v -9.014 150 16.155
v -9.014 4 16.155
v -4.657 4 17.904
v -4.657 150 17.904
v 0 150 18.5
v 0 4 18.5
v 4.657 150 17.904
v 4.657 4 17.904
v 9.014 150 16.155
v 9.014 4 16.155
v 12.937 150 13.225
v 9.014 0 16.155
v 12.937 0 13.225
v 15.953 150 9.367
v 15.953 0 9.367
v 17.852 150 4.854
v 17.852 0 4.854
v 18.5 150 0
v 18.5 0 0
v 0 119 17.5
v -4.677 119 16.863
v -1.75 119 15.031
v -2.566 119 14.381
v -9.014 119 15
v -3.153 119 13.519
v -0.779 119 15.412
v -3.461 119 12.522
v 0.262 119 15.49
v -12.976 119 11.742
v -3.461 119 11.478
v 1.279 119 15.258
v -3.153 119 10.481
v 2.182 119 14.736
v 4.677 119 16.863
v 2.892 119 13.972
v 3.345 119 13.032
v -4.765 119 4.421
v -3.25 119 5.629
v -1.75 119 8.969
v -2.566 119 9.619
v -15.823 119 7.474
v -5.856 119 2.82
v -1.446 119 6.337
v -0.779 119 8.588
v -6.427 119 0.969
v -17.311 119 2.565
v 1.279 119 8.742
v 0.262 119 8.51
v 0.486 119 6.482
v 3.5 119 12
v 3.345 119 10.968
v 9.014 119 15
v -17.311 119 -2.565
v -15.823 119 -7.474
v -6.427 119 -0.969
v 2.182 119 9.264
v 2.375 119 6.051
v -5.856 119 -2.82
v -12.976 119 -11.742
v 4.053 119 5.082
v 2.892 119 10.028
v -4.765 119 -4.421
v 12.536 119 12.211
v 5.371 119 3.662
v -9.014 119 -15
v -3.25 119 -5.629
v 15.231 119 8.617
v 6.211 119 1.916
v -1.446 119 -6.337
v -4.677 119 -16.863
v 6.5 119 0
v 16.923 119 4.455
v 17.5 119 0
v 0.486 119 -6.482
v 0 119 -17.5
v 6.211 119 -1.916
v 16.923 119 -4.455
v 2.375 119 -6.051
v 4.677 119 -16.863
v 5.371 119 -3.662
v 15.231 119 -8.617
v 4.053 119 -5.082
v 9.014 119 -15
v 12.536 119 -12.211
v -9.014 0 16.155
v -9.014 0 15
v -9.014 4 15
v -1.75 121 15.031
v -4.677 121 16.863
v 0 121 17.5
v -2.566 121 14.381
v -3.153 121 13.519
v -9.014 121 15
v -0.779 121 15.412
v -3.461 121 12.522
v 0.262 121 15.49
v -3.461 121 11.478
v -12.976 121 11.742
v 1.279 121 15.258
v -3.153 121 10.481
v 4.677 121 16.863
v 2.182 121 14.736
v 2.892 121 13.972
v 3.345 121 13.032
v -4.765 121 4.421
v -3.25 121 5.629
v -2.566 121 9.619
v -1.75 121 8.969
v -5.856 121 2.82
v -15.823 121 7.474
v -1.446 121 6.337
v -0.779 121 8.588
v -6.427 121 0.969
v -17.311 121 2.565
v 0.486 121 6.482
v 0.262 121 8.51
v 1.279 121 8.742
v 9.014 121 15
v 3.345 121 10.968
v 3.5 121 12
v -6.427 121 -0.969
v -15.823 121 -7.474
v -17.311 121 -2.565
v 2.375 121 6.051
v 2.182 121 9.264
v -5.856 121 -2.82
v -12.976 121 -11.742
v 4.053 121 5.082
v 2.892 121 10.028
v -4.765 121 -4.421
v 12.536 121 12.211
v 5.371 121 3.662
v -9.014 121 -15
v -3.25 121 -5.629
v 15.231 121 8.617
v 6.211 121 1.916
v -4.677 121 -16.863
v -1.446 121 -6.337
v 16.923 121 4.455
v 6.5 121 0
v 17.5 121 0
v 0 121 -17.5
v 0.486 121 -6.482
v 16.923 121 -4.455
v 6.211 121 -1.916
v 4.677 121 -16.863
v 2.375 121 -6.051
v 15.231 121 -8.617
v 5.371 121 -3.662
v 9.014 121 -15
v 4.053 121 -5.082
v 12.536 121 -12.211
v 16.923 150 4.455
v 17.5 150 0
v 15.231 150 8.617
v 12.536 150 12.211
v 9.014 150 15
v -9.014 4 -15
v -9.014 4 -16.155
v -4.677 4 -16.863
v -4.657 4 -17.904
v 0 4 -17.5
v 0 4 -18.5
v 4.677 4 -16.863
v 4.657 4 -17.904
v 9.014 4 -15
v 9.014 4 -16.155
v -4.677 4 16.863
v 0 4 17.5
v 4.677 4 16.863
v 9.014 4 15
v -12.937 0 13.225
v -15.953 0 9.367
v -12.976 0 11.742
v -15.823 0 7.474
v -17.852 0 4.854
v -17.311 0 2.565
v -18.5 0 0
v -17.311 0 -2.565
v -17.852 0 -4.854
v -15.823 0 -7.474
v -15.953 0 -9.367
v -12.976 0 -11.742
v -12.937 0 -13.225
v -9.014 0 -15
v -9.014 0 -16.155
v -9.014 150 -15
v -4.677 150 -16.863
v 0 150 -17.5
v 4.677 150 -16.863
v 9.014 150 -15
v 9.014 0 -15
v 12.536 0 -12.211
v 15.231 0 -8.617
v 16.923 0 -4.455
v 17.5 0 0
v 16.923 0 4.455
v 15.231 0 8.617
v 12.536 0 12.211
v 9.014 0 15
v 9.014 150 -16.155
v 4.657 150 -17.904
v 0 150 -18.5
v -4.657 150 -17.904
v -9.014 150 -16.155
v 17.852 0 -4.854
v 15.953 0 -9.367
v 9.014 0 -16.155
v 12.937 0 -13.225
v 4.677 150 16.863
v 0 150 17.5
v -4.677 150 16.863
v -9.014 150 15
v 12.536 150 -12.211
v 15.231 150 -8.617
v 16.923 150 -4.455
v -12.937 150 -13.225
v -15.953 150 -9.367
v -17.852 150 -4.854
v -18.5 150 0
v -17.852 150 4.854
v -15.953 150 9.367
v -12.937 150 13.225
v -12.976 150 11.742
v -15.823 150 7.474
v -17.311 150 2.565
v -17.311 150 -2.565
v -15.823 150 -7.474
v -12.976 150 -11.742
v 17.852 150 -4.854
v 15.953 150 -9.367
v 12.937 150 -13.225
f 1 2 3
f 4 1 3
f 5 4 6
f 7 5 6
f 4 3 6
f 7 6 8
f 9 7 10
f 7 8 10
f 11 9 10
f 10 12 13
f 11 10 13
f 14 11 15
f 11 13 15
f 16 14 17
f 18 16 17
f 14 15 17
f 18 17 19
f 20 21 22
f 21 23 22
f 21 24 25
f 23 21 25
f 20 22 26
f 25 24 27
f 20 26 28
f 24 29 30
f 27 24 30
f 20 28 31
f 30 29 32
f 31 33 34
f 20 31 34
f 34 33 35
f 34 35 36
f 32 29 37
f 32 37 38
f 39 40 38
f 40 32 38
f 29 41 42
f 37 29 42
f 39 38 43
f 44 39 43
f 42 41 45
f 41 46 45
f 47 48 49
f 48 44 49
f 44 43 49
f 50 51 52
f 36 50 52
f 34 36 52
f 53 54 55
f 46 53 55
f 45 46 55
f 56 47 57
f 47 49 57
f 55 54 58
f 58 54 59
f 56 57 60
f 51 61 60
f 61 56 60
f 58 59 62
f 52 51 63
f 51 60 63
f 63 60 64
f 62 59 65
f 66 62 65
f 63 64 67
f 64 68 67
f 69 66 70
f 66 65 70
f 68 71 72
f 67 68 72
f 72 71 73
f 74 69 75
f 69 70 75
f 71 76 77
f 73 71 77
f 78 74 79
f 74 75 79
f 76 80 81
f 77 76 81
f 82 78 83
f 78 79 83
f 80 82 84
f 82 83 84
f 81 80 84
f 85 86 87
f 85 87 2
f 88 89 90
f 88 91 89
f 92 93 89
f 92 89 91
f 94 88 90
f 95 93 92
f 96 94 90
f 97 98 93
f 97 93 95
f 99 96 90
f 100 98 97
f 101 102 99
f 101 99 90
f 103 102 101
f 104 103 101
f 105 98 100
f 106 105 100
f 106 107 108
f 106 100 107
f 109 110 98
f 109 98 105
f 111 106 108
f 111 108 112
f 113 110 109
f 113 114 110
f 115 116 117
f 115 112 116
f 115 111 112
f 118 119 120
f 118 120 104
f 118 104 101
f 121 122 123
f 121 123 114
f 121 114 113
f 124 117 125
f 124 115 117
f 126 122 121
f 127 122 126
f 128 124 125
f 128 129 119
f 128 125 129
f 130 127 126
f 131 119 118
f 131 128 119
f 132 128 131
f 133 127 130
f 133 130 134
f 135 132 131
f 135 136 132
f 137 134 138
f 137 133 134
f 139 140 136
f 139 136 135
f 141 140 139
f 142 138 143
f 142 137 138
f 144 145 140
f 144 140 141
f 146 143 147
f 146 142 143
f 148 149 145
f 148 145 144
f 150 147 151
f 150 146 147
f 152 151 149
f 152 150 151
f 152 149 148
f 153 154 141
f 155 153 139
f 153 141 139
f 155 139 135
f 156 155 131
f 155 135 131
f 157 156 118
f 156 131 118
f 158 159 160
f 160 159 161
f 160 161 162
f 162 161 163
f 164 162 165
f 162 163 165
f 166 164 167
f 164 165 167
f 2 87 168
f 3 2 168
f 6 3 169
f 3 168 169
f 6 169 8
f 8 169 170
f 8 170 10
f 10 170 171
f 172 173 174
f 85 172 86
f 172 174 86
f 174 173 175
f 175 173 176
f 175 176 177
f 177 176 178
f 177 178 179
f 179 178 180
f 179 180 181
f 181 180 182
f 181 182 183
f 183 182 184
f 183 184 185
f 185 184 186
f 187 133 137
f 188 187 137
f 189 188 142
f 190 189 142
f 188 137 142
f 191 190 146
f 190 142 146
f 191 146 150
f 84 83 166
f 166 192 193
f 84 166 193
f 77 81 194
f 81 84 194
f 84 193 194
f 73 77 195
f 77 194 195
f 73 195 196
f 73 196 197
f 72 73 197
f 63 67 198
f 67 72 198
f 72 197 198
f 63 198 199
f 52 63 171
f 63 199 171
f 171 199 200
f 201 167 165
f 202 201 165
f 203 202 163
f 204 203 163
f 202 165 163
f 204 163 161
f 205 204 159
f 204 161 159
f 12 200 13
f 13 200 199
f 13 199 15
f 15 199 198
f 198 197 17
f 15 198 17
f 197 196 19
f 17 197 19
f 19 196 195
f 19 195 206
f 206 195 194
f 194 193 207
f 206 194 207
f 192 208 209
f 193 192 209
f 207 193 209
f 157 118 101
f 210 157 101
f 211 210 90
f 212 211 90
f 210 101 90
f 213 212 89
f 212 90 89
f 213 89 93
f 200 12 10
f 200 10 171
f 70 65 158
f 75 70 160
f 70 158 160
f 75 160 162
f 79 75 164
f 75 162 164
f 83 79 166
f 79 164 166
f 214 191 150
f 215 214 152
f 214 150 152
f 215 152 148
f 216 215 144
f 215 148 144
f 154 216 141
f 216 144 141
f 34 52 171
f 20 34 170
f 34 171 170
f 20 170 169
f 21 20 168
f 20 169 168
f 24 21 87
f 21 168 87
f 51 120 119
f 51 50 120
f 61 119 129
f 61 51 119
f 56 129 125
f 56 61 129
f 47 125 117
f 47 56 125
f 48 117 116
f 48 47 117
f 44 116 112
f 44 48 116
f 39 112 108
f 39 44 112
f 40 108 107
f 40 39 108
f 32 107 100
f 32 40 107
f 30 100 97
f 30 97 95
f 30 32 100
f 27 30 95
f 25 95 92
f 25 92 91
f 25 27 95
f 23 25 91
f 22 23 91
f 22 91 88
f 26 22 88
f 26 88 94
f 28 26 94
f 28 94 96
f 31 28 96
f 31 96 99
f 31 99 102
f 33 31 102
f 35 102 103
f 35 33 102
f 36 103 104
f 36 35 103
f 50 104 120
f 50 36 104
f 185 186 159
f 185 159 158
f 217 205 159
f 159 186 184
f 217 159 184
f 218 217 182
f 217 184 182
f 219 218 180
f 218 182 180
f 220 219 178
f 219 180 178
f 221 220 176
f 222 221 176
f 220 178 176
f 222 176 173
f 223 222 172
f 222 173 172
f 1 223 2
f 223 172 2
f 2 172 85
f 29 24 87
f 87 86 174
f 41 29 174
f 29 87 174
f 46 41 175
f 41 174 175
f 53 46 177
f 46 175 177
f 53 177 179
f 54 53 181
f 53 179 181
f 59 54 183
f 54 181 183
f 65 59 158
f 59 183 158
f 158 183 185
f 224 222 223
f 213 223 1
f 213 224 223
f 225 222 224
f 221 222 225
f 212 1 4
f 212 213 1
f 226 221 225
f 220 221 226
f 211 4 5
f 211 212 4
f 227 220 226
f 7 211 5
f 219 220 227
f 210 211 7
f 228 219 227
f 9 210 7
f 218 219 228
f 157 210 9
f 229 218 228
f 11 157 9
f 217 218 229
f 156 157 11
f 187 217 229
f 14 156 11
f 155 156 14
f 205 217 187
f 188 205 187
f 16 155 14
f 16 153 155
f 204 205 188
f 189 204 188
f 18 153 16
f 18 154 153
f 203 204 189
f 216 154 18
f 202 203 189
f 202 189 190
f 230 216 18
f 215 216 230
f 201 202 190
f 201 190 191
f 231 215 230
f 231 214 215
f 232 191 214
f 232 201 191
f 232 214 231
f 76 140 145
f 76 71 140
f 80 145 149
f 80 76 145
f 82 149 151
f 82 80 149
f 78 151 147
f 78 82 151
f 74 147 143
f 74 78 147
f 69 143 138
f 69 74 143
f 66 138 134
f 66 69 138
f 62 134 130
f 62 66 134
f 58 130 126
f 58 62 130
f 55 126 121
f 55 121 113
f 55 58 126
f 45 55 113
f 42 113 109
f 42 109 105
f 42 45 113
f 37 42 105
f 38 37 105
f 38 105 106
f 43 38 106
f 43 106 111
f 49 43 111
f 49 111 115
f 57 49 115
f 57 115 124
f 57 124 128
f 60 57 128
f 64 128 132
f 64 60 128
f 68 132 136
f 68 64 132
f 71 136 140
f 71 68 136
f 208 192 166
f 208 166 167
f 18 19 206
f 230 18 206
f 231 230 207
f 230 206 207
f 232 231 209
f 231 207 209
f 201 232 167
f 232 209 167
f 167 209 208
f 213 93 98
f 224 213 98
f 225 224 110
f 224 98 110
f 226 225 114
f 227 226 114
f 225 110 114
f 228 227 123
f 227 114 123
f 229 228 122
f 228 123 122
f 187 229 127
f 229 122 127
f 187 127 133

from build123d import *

# Parameters (mm, degrees)
SKETCH1_R          = 18.5
SKETCH1_R_2        = 17.5
SHELL_DEPTH        = 150
SKETCH8_R          = 17.5
SKETCH8_R_2        = 3.5
SKETCH8_R_3        = 6.5
RODALIGNER_DEPTH   = 1
CUT_EXTRUDE1_DEPTH = 4


with BuildPart() as part:
    # Sketch1 → Shell (new body)
    with BuildSketch(Plane(origin=(0, 0, 0), x_dir=(1, 0, 0), z_dir=(0, 1, 0))):
        Circle(SKETCH1_R)
        Circle(SKETCH1_R_2, mode=Mode.SUBTRACT)
    extrude(amount=SHELL_DEPTH)

    # Sketch8 → RodAligner (add, symmetric)
    with BuildSketch(Plane(origin=(0, 120, 0), x_dir=(1, 0, 0), z_dir=(0, 1, 0))):
        Circle(SKETCH8_R)
        with Locations((0, -12)):
            Circle(SKETCH8_R_2, mode=Mode.SUBTRACT)
        Circle(SKETCH8_R_3, mode=Mode.SUBTRACT)
    extrude(amount=RODALIGNER_DEPTH, both=True)

    # Sketch1<7> → Cut-Extrude1 (cut)
    with BuildSketch(Plane(origin=(0, 0, 0), x_dir=(1, 0, 0), z_dir=(0, 1, 0))):
        with BuildLine():
            Line((-9.013878189, 16.155494421), (-9.013878189, 15))
            ThreePointArc((-9.013878189, 15), (0, 17.5), (9.013878189, 15))
            Line((9.013878189, 15), (9.013878189, 16.155494421))
            ThreePointArc((9.013878189, 16.155494421), (0, 18.5), (-9.013878189, 16.155494421))
        make_face()
        with BuildLine():
            ThreePointArc((9.013878189, -15), (0, -17.5), (-9.013878189, -15))
            Line((-9.013878189, -15), (-9.013878189, -16.155494421))
            ThreePointArc((-9.013878189, -16.155494421), (0, -18.5), (9.013878189, -16.155494421))
            Line((9.013878189, -16.155494421), (9.013878189, -15))
        make_face()
    extrude(amount=CUT_EXTRUDE1_DEPTH, mode=Mode.SUBTRACT)


solid = part.part
